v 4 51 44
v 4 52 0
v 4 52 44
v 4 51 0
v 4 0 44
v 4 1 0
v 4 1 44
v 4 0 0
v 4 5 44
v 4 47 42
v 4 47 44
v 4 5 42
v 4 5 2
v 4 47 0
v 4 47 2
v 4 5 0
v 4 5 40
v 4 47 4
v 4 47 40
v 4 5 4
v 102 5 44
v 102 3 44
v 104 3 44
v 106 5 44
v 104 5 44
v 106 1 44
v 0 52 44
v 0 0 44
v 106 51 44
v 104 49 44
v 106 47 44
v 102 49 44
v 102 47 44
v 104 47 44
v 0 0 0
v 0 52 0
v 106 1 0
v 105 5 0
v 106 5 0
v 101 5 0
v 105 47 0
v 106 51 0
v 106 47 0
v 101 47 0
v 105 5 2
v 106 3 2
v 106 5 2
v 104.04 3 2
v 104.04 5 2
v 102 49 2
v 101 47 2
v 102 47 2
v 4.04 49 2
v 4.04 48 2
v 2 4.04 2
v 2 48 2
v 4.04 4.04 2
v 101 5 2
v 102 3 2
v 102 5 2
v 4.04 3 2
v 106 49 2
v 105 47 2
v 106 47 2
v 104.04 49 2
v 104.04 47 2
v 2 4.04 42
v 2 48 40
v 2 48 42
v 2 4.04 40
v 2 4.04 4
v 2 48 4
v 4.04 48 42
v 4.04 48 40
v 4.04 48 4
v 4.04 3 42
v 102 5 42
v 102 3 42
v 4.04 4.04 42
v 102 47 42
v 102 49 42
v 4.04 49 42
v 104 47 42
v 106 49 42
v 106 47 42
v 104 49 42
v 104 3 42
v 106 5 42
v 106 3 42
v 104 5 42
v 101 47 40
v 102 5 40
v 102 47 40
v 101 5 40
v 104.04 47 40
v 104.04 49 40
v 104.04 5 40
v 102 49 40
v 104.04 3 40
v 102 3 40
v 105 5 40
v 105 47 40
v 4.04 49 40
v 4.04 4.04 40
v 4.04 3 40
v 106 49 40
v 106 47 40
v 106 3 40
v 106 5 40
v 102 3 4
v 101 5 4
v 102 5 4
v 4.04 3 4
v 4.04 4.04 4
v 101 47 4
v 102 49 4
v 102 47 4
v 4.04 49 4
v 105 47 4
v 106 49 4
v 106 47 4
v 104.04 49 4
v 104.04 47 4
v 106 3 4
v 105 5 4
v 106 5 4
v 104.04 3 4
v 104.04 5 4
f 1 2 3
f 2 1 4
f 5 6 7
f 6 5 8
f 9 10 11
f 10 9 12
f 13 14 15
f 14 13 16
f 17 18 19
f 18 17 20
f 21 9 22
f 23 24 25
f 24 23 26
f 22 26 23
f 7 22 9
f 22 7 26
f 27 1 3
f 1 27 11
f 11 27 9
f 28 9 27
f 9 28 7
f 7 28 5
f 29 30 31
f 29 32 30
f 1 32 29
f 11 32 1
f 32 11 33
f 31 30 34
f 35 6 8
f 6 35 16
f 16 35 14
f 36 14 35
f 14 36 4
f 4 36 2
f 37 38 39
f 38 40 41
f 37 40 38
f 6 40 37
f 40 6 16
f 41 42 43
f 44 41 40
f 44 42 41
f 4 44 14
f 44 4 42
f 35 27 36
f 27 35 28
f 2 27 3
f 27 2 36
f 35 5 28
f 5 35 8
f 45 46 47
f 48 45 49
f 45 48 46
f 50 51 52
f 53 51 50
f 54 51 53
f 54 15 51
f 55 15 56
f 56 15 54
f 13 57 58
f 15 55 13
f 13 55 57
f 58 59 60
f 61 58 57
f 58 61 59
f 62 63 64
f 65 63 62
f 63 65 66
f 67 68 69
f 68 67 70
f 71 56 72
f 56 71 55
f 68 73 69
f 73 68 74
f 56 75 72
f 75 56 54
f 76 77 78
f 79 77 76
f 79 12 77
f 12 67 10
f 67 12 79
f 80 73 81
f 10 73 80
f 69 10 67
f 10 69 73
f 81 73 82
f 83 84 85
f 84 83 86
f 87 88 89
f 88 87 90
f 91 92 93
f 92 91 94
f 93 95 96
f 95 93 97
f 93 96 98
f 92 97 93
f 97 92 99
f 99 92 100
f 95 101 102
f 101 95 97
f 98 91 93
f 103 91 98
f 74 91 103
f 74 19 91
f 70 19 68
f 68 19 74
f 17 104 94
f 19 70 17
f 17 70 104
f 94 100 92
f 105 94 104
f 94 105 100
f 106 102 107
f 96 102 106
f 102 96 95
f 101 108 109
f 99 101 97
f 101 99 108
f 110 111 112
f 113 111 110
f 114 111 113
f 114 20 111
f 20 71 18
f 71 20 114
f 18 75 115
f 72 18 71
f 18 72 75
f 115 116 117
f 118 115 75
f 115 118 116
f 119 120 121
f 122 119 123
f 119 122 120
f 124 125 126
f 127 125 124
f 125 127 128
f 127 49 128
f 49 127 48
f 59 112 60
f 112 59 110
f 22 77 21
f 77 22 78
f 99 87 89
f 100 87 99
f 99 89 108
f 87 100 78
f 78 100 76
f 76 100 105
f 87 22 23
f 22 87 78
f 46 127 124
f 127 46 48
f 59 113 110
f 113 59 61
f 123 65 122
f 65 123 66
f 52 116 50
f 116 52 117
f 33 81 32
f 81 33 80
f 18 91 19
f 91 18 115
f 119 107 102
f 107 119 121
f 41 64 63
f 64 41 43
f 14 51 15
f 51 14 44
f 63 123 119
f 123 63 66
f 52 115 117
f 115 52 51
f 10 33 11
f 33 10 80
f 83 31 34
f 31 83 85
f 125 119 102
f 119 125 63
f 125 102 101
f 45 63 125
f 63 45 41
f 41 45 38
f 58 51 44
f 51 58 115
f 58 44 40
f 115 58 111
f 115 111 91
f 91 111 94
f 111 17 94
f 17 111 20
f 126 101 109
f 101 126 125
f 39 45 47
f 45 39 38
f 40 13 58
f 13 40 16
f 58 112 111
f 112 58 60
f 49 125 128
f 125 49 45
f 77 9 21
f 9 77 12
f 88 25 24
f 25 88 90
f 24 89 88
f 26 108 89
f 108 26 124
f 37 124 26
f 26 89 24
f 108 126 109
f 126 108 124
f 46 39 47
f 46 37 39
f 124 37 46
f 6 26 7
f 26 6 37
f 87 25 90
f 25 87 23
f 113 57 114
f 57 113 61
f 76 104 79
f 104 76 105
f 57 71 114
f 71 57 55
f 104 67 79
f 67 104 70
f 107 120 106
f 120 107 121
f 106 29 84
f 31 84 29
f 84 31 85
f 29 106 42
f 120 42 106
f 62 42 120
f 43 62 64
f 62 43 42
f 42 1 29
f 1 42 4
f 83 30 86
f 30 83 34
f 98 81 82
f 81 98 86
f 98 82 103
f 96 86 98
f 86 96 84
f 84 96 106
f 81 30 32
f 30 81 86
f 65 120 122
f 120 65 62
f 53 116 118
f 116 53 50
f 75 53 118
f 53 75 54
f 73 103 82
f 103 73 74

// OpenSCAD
// #########################################
// Repository: OpenSCAD
// Name: resistors_box_v2.scad
// Author: Gulo
// Created: 2024-08-23
// Synopsis: A box with embossed and debossed lettering and symbols to hold resistors to be used at conferences or storage
// Requirements:
//   Box long enough to hold through hole resistors
//   Sides embossed with resitor value (as a variable)
//   One end debossed with the Combobulate Tech logo
//   A lid debossed with resistor value (as a variable)
//   Chamfered vertical corners
//   Box made of sliders for cleaner prints
//   Other short side will need to be shorter than the first side to leave space for the lid to slide in
// Revision History: (Date\tAuthor\tCommit\tMessage)

// #########################################


// ################ Define Variables ################


// ################ Dimensions ################


// Define all of the side dimensions
side_length = 102;
side_width = 52;
side_height = 44;
side_thickness = 4;
side_switch_thickness = 8;
side_low_height = side_height - side_thickness;
//side_low_width = side_width - (side_thickness * 3);
side_low_width = side_width - 10;

// Define all groove dimensions
groove_length = side_length;
groove_width = side_width - 4;
groove_height = side_height - 2;
groove_thickness = side_thickness - 2;

// Define all tongue dimensions
tongue_length = groove_length;
tongue_width = groove_width;
tongue_height = groove_height;
tongue_thickness = groove_thickness + 0.04;
tongue_switch_thickness = groove_thickness;
tongue_low_height = side_low_height - 2;

// ######## Coordinates ########


//######## Short Side 1 ########


// Short side 1 coordinates
short_s1_x = 0;
short_s1_y = 0;
short_s1_z = 0;

// Short side 1 vertical groove 1
short_s1_g1_vert_x = short_s1_x + groove_thickness;
short_s1_g1_vert_y = short_s1_y + groove_thickness;
short_s1_g1_vert_z = short_s1_z + groove_thickness;

// Short side 1 vertical groove 2
short_s1_g2_vert_x = short_s1_x + groove_thickness;
short_s1_g2_vert_y = (short_s1_y + side_width) - (groove_thickness * 2);
short_s1_g2_vert_z = short_s1_z + groove_thickness;

// Short side 1 horizontal groove 3
short_s1_g3_horiz_x = short_s1_x + groove_thickness;
short_s1_g3_horiz_y = short_s1_y + groove_thickness;
short_s1_g3_horiz_z = side_height - (groove_thickness * 2);

// Short side 1 horizontal groove 4
short_s1_g4_horiz_x = short_s1_x + groove_thickness;
short_s1_g4_horiz_y = short_s1_y + groove_thickness;
short_s1_g4_horiz_z = short_s1_z + groove_thickness;

//######## Short Side 2 ########


// Short side 2 (low) coordinates
short_s2_x = short_s1_x + side_length - 1;
short_s2_y = short_s1_y + 5;
short_s2_z = short_s1_z;

// Short side 2 vertical tongue 1
short_s2_t1_vert_x = short_s2_x + (groove_thickness / 2);
short_s2_t1_vert_y = short_s2_y - groove_thickness;
short_s2_t1_vert_z = short_s2_z + groove_thickness;

// Short side 2 vertical tongue 2
short_s2_t2_vert_x = short_s2_x + (groove_thickness / 2);
short_s2_t2_vert_y = short_s2_y + side_low_width;
short_s2_t2_vert_z = short_s2_z + groove_thickness;

//######## Long Side 1 ########

// Long side 1 coordinates
long_s1_x = short_s1_x + 4;
long_s1_y = short_s1_y + 1;
long_s1_z = short_s1_z;

// Long side 1 vertical tongue 1
long_s1_t1_vert_x = long_s1_x - groove_thickness;
long_s1_t1_vert_y = long_s1_y + (groove_thickness / 2);
long_s1_t1_vert_z = long_s1_z + groove_thickness;

// Long side 1 vertical groove 1
long_s1_g1_vert_x = (long_s1_x + side_length) - (groove_thickness * 2);
long_s1_g1_vert_y = long_s1_y + groove_thickness;
long_s1_g1_vert_z = long_s1_z + groove_thickness;

// Long side 1 horizontal groove 2
long_s1_g2_horiz_x = long_s1_x;
long_s1_g2_horiz_y = long_s1_y + groove_thickness;
long_s1_g2_horiz_z = side_height - (groove_thickness * 2);

// Long side 1 horizontal groove 3
long_s1_g3_horiz_x = long_s1_x;
long_s1_g3_horiz_y = long_s1_y + groove_thickness;
long_s1_g3_horiz_z = long_s1_z + groove_thickness;


//######## Long Side 2 ########

// Long side 2 coordinates
long_s2_x = short_s1_x + 4;
long_s2_y = side_width - 5;
long_s2_z = short_s1_z;

// Long side 2 vertical tongue 1
long_s2_t1_vert_x = long_s2_x - groove_thickness;
long_s2_t1_vert_y = long_s2_y + (groove_thickness / 2);
long_s2_t1_vert_z = long_s2_z + groove_thickness;

// Long side 2 vertical groove 1
long_s2_g1_vert_x = (long_s2_x + side_length) - (groove_thickness * 2);
long_s2_g1_vert_y = long_s2_y;
long_s2_g1_vert_z = long_s2_z + groove_thickness;

// Long side 2 horizontal groove 2
long_s2_g2_horiz_x = long_s2_x;
long_s2_g2_horiz_y = long_s2_y;
long_s2_g2_horiz_z = side_height - (groove_thickness * 2);

// Long side 2 horizontal groove 3
long_s2_g3_horiz_x = long_s2_x;
long_s2_g3_horiz_y = long_s2_y;
long_s2_g3_horiz_z = long_s2_z + groove_thickness;

// ######## Box Misc ########

resistance = "110 Ω";

// ################# Box Lid Shape ################



// ################ Build Shape ################


// ######## Short Side 1 ########


// Create the negative space of the groove in short side 1
difference() {

    // Create short side 1 of the box
    translate([short_s1_x, short_s1_y, short_s1_z]) {
        color([0.5, 0.5, 0.5, 0.8])
        cube([side_thickness, side_width, side_height], center=false);
    }

    // Create short side 1 vertical groove 1
    translate([short_s1_g1_vert_x, short_s1_g1_vert_y, short_s1_g1_vert_z]) {
        color([0.9, 0.5, 0.5, 0.8])
        cube([groove_thickness, groove_thickness, groove_height], center=false);
    }
    
    // Create short side 1 vertical groove 2
    translate([short_s1_g2_vert_x, short_s1_g2_vert_y, short_s1_g2_vert_z]) {
        color([0.9, 0.5, 0.5, 0.8])
        cube([groove_thickness, groove_thickness, groove_height], center=false);
    }

    // Create short side 1 horizontal groove 3
    translate([short_s1_g3_horiz_x, short_s1_g3_horiz_y, short_s1_g3_horiz_z]) {
        color([0.9, 0.5, 0.5, 0.8])
        cube([groove_length, groove_width, groove_thickness], center=false);
    }
    
    // Create short side 1 horizontal groove 4
    translate([short_s1_g4_horiz_x, short_s1_g4_horiz_y, short_s1_g4_horiz_z]) {
        color([0.9, 0.5, 0.5, 0.8])
        cube([groove_length, groove_width, groove_thickness], center=false);
    }
}

// ######## Short Side 2 (low side) ########


// Join the tongue to the short side
union() {
    // Create short side 2 vertical tongue 1
    translate([short_s2_t1_vert_x, short_s2_t1_vert_y, short_s2_t1_vert_z]) {
        color([0.9, 0.5, 0.5, 0.8])
        cube([tongue_thickness, tongue_thickness, tongue_low_height], center=false);
    }

    // Create short side 2 vertical tongue 2
    translate([short_s2_t2_vert_x, short_s2_t2_vert_y, short_s2_t2_vert_z]) {
        color([0.9, 0.5, 0.5, 0.8])
        cube([tongue_thickness, tongue_thickness, tongue_low_height], center=false);
    }

    // Create short side 2 of the box
    translate([short_s2_x, short_s2_y, short_s2_z]) {
        color([0.5, 0.5, 0.5, 0.8])
        cube([side_thickness, side_low_width, side_low_height], center=false);
    }
}

// ######## Long Side 1 ########


// Join the tongue to the long side
union() {
    // Create long side 1 vertical tongue 1
    translate([long_s1_t1_vert_x, long_s1_t1_vert_y, long_s1_t1_vert_z]) {
        color([0.9, 0.5, 0.5, 0.8])
        cube([tongue_thickness, tongue_thickness, tongue_height], center=false);
    }

    // Create the negative space of the groove in long side 1
    difference() {
        // Create long side 1 of the box
        translate([long_s1_x, long_s1_y, long_s1_z]) {
            color([0.5, 0.5, 0.5, 0.8])
            cube([side_length, side_thickness, side_height], center=false);
        }

        // Create long side 1 vertical groove 1
        translate([long_s1_g1_vert_x, long_s1_g1_vert_y, long_s1_g1_vert_z]) {
            color([0.9, 0.5, 0.5, 0.8])
            cube([groove_thickness, groove_thickness, groove_height], center=false);
        }

        // Create long side 1 horizontal groove 2
        translate([long_s1_g2_horiz_x, long_s1_g2_horiz_y, long_s1_g2_horiz_z]) {
            color([0.9, 0.5, 0.5, 0.8])
            cube([groove_length, groove_thickness, groove_thickness], center=false);
        }

        // Create long side 1 horizontal groove 3
        translate([long_s1_g3_horiz_x, long_s1_g3_horiz_y, long_s1_g3_horiz_z]) {
            color([0.9, 0.5, 0.5, 0.8])
            cube([groove_length, groove_thickness, groove_thickness], center=false);
        }
    }
}

// ######## Long Side 2 ########


// Join the tongue to the long side
union() {
    // Create long side 2 vertical tongue 1
    translate([long_s2_t1_vert_x, long_s2_t1_vert_y, long_s2_t1_vert_z]) {
        color([0.9, 0.5, 0.5, 0.8])
        cube([tongue_thickness, tongue_thickness, tongue_height], center=false);
    }

    // Create the negative space of the groove in long side 2
    difference() {
        // Create long side 2 of the box
        translate([long_s2_x, long_s2_y, long_s2_z]) {
            color([0.5, 0.5, 0.5, 0.8])
            cube([side_length, side_thickness, side_height], center=false);
        }

        // Create long side 2 vertical groove 1
        translate([long_s2_g1_vert_x, long_s2_g1_vert_y, long_s2_g1_vert_z]) {
            color([0.9, 0.5, 0.5, 0.8])
            cube([groove_thickness, groove_thickness, groove_height], center=false);
        }
        
        // Create long side 2 horizontal groove 2
        translate([long_s2_g2_horiz_x, long_s2_g2_horiz_y, long_s2_g2_horiz_z]) {
            color([0.9, 0.5, 0.5, 0.8])
            cube([groove_length, groove_thickness, groove_thickness], center=false);
        }

        // Create long side 1 horizontal groove 3
        translate([long_s2_g3_horiz_x, long_s2_g3_horiz_y, long_s2_g3_horiz_z]) {
            color([0.9, 0.5, 0.5, 0.8])
            cube([groove_length, groove_thickness, groove_thickness], center=false);
        }
    }
}
